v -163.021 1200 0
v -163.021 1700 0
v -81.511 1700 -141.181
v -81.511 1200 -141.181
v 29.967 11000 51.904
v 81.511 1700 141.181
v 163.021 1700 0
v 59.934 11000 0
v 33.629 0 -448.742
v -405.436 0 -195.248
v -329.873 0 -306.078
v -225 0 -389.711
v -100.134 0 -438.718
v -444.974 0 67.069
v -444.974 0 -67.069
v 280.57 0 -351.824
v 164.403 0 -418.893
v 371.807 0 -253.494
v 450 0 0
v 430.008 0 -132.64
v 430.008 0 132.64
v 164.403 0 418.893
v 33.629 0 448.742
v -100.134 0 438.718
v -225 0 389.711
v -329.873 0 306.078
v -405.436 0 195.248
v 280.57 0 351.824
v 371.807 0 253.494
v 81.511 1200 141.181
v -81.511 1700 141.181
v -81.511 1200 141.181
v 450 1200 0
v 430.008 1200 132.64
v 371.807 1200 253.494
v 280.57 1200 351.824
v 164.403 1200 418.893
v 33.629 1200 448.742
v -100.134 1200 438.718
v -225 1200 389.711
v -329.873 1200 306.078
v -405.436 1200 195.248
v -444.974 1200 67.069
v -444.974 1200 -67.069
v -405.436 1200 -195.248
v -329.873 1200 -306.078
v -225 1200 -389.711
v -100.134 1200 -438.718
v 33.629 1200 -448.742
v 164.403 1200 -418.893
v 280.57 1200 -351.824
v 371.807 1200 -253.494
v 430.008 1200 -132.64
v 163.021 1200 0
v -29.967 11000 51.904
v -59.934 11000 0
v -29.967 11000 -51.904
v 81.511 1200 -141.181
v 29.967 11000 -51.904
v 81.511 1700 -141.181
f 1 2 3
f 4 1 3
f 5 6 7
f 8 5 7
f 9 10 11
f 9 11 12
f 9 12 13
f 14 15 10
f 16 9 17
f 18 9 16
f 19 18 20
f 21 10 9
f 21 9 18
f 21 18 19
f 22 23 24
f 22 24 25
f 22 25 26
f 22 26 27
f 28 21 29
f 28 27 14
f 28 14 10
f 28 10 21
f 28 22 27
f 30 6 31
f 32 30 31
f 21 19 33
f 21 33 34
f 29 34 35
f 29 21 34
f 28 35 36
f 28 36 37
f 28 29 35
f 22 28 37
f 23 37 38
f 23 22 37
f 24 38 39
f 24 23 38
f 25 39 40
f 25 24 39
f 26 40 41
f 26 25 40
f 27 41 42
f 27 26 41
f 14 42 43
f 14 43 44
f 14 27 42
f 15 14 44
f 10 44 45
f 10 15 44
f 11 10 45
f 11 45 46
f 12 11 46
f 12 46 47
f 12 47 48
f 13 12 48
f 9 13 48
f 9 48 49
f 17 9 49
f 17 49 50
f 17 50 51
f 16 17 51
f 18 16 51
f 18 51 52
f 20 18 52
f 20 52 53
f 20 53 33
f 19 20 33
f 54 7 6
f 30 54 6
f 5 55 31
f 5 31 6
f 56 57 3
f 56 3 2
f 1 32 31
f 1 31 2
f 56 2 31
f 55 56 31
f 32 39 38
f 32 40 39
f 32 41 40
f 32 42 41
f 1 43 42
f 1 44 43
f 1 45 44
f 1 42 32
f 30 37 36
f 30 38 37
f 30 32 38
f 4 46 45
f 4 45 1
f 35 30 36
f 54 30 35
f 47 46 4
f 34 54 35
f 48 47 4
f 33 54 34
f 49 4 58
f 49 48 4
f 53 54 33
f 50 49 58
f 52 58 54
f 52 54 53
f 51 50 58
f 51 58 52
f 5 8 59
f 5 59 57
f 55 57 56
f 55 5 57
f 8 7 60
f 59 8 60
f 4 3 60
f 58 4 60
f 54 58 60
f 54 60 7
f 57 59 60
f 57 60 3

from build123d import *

# Parameters (mm, degrees)
SALIENTE_EXTRUIR1_DEPTH = 11000
SALIENTE_EXTRUIR1_TAPER = 0.55
CROQUIS2_R              = 450
SALIENTE_EXTRUIR2_DEPTH = 1700
CROQUIS3_R              = 466.892947344
CORTAR_EXTRUIR1_DEPTH   = 500


with BuildPart() as part:
    # Croquis1 → Saliente-Extruir1 (new body)
    with BuildSketch(Plane(origin=(0, 0, 0), x_dir=(1, 0, 0), z_dir=(0, 1, 0))):
        Polygon((181.865334795, 0), (90.932667397, 157.5), (-90.932667397, 157.5), (-181.865334795, 0), (-90.932667397, -157.5), (90.932667397, -157.5), align=None)
    extrude(amount=SALIENTE_EXTRUIR1_DEPTH, taper=SALIENTE_EXTRUIR1_TAPER)

    # Croquis2 → Saliente-Extruir2 (add)
    with BuildSketch(Plane.XZ):
        Circle(CROQUIS2_R)
    extrude(amount=-SALIENTE_EXTRUIR2_DEPTH)

    # Croquis3 → Cortar-Extruir1 (cut)
    with BuildSketch(Plane(origin=(0, 1700, 0), x_dir=(1, 0, 0), z_dir=(0, 1, 0))):
        Circle(CROQUIS3_R)
        Polygon((163.021395927, 0), (81.510697963, -141.180670233), (-81.510697963, -141.180670233), (-163.021395927, 0), (-81.510697963, 141.180670233), (81.510697963, 141.180670233), align=None, mode=Mode.SUBTRACT)
    extrude(amount=-CORTAR_EXTRUIR1_DEPTH, mode=Mode.SUBTRACT)


solid = part.part
